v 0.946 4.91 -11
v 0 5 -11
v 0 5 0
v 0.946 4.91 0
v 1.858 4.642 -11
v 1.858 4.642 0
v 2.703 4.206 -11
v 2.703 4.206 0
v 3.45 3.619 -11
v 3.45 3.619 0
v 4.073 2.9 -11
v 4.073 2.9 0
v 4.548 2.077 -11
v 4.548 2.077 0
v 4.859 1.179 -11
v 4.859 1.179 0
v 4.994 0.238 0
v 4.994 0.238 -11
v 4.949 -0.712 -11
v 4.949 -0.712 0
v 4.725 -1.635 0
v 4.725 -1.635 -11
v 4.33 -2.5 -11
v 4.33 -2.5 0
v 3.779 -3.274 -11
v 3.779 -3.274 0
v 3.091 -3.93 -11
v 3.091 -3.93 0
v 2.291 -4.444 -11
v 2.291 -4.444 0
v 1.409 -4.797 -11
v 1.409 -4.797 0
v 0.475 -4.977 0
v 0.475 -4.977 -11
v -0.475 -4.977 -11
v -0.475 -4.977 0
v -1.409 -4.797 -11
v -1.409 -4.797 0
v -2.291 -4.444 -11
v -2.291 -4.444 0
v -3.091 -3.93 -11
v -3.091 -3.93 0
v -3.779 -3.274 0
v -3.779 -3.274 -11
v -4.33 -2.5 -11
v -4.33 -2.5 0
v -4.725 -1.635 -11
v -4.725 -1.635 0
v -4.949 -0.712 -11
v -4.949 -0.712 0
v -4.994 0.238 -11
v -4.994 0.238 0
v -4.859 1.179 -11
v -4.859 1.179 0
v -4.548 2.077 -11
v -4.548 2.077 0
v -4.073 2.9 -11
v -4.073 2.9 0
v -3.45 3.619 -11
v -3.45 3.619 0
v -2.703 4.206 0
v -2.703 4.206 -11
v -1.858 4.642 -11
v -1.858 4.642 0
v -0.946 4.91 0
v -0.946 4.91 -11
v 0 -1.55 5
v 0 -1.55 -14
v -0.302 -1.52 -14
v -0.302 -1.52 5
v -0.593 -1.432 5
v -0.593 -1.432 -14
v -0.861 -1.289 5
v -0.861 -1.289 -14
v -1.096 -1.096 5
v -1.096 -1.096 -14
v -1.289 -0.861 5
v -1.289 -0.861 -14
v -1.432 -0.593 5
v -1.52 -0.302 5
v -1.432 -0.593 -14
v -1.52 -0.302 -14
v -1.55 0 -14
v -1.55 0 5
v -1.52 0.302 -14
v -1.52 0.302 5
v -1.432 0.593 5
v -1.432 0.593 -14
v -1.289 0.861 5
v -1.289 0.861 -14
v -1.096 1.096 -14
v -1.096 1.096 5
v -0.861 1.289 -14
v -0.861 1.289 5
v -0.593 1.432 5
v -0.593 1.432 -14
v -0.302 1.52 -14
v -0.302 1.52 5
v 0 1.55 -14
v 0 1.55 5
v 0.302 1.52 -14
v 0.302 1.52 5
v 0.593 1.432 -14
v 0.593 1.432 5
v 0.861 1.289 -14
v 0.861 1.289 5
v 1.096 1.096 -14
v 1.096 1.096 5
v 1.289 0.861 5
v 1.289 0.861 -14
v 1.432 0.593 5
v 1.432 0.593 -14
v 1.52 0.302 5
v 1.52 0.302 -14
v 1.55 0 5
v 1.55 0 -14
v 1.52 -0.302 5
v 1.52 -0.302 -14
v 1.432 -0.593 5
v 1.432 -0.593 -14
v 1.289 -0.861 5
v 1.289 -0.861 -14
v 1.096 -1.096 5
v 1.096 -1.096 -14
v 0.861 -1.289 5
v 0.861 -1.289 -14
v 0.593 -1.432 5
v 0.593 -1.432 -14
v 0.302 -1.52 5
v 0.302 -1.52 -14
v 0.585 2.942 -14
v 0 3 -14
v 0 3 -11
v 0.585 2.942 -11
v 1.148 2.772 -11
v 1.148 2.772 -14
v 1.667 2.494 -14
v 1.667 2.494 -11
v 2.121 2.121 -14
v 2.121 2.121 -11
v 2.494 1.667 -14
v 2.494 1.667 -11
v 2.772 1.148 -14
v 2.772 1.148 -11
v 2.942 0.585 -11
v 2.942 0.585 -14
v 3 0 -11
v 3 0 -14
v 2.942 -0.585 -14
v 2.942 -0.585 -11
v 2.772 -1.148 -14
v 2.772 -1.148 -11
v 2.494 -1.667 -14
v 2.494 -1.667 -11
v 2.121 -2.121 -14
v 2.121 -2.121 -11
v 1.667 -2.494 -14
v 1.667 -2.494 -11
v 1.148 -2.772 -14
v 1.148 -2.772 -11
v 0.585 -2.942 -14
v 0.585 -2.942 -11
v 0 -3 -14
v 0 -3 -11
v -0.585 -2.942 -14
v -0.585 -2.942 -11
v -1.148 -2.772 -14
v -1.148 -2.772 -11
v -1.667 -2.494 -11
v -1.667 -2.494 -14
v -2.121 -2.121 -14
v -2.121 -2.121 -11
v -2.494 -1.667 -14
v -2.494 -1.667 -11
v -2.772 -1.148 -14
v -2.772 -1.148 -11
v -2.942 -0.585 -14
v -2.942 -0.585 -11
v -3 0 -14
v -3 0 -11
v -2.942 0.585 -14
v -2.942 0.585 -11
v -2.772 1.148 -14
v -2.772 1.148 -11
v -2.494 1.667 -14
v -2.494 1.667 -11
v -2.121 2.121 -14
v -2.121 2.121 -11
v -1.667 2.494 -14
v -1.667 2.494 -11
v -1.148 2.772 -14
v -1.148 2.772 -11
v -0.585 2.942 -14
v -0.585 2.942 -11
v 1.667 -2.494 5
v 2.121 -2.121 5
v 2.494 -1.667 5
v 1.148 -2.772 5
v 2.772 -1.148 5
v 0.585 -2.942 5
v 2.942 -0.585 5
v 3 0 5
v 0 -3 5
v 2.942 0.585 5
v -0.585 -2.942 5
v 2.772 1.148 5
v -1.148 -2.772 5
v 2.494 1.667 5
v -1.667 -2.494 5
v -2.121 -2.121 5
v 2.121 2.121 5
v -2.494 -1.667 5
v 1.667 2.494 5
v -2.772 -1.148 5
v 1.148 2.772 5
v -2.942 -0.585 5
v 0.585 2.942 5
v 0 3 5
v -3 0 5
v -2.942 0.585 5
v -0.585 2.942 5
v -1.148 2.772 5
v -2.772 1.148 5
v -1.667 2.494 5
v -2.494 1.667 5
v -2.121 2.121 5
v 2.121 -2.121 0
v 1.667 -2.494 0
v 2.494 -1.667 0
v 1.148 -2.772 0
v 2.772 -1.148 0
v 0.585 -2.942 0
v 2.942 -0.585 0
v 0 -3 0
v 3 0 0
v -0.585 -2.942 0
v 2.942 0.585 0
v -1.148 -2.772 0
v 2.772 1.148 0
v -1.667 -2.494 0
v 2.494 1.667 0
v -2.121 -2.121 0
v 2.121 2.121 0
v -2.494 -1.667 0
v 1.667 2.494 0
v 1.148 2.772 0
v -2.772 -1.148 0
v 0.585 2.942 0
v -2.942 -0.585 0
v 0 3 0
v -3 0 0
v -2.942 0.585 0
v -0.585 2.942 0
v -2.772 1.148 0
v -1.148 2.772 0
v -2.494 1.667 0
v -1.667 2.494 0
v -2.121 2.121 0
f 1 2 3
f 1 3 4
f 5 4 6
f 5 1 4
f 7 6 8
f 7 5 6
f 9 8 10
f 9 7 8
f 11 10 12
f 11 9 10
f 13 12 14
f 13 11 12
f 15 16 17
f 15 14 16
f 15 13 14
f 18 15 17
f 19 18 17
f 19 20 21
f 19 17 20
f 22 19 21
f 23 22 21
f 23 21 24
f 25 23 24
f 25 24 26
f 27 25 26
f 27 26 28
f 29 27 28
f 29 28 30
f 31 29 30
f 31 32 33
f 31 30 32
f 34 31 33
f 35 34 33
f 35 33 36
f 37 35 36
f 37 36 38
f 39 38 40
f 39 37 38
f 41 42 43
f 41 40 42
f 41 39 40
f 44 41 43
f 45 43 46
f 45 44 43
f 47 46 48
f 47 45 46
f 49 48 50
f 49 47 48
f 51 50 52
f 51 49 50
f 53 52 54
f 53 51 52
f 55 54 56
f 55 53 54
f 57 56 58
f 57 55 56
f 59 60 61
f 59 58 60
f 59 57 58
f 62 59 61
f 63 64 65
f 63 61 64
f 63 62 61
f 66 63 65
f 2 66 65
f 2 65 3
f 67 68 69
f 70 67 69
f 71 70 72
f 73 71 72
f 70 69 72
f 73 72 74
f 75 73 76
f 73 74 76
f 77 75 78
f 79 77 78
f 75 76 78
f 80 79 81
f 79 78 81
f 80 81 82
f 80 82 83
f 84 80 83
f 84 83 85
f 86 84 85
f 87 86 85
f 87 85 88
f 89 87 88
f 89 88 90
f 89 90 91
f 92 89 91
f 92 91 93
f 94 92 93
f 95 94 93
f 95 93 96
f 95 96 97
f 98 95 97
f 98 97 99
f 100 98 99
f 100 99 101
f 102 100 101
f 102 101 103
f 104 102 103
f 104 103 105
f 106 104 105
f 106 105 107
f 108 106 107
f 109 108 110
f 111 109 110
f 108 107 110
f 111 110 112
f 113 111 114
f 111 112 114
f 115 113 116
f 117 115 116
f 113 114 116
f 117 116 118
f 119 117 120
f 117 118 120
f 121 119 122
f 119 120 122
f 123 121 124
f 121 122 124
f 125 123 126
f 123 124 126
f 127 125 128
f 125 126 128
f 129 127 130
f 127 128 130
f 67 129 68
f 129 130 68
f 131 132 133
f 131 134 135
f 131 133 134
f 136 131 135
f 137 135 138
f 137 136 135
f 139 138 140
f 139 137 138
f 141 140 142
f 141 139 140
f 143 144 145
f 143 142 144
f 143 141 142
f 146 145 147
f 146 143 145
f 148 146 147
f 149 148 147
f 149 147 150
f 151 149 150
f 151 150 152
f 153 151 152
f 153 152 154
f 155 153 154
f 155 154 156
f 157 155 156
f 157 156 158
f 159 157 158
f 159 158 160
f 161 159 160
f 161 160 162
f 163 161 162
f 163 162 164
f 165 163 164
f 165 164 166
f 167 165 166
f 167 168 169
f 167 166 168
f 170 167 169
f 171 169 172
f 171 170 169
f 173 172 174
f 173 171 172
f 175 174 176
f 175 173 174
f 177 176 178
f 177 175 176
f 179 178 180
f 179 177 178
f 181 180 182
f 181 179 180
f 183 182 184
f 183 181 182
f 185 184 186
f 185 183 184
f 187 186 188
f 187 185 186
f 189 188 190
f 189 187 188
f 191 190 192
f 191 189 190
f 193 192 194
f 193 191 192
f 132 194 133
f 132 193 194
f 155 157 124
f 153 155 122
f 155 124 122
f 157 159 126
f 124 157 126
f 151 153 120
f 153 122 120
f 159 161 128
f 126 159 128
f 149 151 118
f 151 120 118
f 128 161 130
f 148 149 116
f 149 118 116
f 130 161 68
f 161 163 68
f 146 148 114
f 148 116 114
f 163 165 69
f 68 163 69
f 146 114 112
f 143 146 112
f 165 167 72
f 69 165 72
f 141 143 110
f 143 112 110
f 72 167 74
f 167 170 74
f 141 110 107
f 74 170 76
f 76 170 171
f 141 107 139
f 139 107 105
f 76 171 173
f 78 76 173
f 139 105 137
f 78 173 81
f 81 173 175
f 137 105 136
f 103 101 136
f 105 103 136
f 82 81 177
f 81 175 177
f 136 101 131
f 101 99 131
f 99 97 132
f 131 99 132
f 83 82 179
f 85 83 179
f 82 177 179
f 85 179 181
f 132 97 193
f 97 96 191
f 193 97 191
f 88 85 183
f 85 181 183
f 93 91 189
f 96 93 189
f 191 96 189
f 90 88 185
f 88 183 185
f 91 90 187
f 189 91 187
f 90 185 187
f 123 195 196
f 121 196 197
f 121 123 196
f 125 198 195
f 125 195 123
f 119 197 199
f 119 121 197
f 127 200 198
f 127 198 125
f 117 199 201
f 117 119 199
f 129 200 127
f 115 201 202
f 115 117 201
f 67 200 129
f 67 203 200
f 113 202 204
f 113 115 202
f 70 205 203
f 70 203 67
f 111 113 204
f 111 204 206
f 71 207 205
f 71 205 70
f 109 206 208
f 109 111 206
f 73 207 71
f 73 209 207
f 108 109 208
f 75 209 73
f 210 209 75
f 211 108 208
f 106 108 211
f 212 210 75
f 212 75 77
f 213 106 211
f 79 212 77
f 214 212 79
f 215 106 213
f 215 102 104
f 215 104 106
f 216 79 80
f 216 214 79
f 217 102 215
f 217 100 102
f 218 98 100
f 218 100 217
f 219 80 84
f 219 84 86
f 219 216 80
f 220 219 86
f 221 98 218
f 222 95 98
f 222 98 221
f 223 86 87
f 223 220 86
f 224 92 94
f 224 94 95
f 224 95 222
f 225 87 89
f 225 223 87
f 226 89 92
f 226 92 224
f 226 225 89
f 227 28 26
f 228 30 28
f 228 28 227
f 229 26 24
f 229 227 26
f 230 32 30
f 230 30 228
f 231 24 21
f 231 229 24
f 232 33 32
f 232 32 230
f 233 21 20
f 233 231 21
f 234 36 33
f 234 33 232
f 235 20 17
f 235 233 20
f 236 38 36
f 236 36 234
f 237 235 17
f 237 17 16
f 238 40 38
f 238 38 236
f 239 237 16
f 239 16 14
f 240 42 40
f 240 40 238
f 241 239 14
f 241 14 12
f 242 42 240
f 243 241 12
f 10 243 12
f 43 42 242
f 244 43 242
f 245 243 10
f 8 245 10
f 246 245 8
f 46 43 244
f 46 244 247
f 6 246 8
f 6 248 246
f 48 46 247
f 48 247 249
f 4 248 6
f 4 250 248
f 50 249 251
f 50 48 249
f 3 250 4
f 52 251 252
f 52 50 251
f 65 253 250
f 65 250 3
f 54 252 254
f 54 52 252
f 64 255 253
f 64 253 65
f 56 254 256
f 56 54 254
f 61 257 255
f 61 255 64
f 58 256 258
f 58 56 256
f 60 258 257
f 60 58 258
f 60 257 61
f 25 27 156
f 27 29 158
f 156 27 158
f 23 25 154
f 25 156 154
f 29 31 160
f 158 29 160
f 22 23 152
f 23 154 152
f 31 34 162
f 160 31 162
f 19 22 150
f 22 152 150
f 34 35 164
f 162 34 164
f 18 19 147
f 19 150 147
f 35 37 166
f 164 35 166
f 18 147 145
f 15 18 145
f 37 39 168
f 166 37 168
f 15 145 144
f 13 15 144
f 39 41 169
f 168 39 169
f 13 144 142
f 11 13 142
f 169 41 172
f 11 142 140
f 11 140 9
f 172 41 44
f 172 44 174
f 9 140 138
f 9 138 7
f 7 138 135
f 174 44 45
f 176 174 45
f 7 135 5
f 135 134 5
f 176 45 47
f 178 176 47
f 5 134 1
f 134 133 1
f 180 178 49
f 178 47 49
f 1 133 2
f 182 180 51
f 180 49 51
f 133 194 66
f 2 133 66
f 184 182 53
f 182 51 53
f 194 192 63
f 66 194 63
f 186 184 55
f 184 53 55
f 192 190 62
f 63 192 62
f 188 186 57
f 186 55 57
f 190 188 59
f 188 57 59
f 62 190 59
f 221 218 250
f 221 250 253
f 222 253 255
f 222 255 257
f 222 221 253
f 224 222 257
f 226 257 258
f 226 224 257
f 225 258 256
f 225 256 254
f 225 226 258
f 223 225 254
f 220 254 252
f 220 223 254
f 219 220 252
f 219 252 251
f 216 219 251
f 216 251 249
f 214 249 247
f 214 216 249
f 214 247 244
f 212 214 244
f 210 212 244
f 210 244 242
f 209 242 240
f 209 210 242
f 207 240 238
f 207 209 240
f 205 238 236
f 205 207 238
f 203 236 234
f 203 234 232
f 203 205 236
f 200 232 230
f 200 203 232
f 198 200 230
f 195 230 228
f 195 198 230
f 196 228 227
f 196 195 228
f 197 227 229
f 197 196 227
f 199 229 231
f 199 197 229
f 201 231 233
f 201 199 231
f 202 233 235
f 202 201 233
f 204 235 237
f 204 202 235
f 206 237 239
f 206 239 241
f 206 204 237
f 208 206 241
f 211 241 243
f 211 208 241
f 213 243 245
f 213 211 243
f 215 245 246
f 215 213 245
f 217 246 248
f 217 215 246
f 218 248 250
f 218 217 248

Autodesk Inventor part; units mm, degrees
ref_plane "YZ Plane" through (0, 0, 0) normal (1, 0, 0) x (0, 1, 0)
ref_plane "XZ Plane" through (0, 0, 0) normal (0, 1, 0) x (-1, 0, 0)
ref_plane "XY Plane" through (0, 0, 0) normal (0, 0, 1) x (1, 0, 0)
sketch "スケッチ1" plane through (0, 0, 0) normal (1, 0, 0) x (0, 1, 0)
  line L0 (0, 0) -> (3, 0)
  line L1 (3, 0) -> (3, 5)
  line L2 (3, 5) -> (0, 5)
  line L3 (0, 5) -> (0, 0)
  line L4 (0, 0) -> (5, 0)
  line L5 (5, 0) -> (5, -11)
  line L6 (5, -11) -> (0, -11)
  line L7 (0, -11) -> (0, 0)
  line L8 (0, -11) -> (3, -11)
  line L9 (3, -11) -> (3, -14)
  line L10 (3, -14) -> (0, -14)
  line L11 (0, -14) -> (0, -11)
  dimension "d0" = 3
  dimension "d1" = 5
  dimension "d2" = 5
  dimension "d3" = 11
  dimension "d4" = 3
  dimension "d5" = 3
revolve "回転1" add sketch "スケッチ1" angle 360 about axis through (0, 0, -11) along (0, 0, 1)
sketch "スケッチ2" plane through (0, 0, 5) normal (0, 0, 1) x (1, 0, 0)
  point P0 (0, 0)
  point P1 (0, 0)
hole "穴1" at (0, 0, 5) direction (0, 0, -1) diameter 3.1 end through all
properties part number "ベース板連結棒" material "アルミニウム 6061"
